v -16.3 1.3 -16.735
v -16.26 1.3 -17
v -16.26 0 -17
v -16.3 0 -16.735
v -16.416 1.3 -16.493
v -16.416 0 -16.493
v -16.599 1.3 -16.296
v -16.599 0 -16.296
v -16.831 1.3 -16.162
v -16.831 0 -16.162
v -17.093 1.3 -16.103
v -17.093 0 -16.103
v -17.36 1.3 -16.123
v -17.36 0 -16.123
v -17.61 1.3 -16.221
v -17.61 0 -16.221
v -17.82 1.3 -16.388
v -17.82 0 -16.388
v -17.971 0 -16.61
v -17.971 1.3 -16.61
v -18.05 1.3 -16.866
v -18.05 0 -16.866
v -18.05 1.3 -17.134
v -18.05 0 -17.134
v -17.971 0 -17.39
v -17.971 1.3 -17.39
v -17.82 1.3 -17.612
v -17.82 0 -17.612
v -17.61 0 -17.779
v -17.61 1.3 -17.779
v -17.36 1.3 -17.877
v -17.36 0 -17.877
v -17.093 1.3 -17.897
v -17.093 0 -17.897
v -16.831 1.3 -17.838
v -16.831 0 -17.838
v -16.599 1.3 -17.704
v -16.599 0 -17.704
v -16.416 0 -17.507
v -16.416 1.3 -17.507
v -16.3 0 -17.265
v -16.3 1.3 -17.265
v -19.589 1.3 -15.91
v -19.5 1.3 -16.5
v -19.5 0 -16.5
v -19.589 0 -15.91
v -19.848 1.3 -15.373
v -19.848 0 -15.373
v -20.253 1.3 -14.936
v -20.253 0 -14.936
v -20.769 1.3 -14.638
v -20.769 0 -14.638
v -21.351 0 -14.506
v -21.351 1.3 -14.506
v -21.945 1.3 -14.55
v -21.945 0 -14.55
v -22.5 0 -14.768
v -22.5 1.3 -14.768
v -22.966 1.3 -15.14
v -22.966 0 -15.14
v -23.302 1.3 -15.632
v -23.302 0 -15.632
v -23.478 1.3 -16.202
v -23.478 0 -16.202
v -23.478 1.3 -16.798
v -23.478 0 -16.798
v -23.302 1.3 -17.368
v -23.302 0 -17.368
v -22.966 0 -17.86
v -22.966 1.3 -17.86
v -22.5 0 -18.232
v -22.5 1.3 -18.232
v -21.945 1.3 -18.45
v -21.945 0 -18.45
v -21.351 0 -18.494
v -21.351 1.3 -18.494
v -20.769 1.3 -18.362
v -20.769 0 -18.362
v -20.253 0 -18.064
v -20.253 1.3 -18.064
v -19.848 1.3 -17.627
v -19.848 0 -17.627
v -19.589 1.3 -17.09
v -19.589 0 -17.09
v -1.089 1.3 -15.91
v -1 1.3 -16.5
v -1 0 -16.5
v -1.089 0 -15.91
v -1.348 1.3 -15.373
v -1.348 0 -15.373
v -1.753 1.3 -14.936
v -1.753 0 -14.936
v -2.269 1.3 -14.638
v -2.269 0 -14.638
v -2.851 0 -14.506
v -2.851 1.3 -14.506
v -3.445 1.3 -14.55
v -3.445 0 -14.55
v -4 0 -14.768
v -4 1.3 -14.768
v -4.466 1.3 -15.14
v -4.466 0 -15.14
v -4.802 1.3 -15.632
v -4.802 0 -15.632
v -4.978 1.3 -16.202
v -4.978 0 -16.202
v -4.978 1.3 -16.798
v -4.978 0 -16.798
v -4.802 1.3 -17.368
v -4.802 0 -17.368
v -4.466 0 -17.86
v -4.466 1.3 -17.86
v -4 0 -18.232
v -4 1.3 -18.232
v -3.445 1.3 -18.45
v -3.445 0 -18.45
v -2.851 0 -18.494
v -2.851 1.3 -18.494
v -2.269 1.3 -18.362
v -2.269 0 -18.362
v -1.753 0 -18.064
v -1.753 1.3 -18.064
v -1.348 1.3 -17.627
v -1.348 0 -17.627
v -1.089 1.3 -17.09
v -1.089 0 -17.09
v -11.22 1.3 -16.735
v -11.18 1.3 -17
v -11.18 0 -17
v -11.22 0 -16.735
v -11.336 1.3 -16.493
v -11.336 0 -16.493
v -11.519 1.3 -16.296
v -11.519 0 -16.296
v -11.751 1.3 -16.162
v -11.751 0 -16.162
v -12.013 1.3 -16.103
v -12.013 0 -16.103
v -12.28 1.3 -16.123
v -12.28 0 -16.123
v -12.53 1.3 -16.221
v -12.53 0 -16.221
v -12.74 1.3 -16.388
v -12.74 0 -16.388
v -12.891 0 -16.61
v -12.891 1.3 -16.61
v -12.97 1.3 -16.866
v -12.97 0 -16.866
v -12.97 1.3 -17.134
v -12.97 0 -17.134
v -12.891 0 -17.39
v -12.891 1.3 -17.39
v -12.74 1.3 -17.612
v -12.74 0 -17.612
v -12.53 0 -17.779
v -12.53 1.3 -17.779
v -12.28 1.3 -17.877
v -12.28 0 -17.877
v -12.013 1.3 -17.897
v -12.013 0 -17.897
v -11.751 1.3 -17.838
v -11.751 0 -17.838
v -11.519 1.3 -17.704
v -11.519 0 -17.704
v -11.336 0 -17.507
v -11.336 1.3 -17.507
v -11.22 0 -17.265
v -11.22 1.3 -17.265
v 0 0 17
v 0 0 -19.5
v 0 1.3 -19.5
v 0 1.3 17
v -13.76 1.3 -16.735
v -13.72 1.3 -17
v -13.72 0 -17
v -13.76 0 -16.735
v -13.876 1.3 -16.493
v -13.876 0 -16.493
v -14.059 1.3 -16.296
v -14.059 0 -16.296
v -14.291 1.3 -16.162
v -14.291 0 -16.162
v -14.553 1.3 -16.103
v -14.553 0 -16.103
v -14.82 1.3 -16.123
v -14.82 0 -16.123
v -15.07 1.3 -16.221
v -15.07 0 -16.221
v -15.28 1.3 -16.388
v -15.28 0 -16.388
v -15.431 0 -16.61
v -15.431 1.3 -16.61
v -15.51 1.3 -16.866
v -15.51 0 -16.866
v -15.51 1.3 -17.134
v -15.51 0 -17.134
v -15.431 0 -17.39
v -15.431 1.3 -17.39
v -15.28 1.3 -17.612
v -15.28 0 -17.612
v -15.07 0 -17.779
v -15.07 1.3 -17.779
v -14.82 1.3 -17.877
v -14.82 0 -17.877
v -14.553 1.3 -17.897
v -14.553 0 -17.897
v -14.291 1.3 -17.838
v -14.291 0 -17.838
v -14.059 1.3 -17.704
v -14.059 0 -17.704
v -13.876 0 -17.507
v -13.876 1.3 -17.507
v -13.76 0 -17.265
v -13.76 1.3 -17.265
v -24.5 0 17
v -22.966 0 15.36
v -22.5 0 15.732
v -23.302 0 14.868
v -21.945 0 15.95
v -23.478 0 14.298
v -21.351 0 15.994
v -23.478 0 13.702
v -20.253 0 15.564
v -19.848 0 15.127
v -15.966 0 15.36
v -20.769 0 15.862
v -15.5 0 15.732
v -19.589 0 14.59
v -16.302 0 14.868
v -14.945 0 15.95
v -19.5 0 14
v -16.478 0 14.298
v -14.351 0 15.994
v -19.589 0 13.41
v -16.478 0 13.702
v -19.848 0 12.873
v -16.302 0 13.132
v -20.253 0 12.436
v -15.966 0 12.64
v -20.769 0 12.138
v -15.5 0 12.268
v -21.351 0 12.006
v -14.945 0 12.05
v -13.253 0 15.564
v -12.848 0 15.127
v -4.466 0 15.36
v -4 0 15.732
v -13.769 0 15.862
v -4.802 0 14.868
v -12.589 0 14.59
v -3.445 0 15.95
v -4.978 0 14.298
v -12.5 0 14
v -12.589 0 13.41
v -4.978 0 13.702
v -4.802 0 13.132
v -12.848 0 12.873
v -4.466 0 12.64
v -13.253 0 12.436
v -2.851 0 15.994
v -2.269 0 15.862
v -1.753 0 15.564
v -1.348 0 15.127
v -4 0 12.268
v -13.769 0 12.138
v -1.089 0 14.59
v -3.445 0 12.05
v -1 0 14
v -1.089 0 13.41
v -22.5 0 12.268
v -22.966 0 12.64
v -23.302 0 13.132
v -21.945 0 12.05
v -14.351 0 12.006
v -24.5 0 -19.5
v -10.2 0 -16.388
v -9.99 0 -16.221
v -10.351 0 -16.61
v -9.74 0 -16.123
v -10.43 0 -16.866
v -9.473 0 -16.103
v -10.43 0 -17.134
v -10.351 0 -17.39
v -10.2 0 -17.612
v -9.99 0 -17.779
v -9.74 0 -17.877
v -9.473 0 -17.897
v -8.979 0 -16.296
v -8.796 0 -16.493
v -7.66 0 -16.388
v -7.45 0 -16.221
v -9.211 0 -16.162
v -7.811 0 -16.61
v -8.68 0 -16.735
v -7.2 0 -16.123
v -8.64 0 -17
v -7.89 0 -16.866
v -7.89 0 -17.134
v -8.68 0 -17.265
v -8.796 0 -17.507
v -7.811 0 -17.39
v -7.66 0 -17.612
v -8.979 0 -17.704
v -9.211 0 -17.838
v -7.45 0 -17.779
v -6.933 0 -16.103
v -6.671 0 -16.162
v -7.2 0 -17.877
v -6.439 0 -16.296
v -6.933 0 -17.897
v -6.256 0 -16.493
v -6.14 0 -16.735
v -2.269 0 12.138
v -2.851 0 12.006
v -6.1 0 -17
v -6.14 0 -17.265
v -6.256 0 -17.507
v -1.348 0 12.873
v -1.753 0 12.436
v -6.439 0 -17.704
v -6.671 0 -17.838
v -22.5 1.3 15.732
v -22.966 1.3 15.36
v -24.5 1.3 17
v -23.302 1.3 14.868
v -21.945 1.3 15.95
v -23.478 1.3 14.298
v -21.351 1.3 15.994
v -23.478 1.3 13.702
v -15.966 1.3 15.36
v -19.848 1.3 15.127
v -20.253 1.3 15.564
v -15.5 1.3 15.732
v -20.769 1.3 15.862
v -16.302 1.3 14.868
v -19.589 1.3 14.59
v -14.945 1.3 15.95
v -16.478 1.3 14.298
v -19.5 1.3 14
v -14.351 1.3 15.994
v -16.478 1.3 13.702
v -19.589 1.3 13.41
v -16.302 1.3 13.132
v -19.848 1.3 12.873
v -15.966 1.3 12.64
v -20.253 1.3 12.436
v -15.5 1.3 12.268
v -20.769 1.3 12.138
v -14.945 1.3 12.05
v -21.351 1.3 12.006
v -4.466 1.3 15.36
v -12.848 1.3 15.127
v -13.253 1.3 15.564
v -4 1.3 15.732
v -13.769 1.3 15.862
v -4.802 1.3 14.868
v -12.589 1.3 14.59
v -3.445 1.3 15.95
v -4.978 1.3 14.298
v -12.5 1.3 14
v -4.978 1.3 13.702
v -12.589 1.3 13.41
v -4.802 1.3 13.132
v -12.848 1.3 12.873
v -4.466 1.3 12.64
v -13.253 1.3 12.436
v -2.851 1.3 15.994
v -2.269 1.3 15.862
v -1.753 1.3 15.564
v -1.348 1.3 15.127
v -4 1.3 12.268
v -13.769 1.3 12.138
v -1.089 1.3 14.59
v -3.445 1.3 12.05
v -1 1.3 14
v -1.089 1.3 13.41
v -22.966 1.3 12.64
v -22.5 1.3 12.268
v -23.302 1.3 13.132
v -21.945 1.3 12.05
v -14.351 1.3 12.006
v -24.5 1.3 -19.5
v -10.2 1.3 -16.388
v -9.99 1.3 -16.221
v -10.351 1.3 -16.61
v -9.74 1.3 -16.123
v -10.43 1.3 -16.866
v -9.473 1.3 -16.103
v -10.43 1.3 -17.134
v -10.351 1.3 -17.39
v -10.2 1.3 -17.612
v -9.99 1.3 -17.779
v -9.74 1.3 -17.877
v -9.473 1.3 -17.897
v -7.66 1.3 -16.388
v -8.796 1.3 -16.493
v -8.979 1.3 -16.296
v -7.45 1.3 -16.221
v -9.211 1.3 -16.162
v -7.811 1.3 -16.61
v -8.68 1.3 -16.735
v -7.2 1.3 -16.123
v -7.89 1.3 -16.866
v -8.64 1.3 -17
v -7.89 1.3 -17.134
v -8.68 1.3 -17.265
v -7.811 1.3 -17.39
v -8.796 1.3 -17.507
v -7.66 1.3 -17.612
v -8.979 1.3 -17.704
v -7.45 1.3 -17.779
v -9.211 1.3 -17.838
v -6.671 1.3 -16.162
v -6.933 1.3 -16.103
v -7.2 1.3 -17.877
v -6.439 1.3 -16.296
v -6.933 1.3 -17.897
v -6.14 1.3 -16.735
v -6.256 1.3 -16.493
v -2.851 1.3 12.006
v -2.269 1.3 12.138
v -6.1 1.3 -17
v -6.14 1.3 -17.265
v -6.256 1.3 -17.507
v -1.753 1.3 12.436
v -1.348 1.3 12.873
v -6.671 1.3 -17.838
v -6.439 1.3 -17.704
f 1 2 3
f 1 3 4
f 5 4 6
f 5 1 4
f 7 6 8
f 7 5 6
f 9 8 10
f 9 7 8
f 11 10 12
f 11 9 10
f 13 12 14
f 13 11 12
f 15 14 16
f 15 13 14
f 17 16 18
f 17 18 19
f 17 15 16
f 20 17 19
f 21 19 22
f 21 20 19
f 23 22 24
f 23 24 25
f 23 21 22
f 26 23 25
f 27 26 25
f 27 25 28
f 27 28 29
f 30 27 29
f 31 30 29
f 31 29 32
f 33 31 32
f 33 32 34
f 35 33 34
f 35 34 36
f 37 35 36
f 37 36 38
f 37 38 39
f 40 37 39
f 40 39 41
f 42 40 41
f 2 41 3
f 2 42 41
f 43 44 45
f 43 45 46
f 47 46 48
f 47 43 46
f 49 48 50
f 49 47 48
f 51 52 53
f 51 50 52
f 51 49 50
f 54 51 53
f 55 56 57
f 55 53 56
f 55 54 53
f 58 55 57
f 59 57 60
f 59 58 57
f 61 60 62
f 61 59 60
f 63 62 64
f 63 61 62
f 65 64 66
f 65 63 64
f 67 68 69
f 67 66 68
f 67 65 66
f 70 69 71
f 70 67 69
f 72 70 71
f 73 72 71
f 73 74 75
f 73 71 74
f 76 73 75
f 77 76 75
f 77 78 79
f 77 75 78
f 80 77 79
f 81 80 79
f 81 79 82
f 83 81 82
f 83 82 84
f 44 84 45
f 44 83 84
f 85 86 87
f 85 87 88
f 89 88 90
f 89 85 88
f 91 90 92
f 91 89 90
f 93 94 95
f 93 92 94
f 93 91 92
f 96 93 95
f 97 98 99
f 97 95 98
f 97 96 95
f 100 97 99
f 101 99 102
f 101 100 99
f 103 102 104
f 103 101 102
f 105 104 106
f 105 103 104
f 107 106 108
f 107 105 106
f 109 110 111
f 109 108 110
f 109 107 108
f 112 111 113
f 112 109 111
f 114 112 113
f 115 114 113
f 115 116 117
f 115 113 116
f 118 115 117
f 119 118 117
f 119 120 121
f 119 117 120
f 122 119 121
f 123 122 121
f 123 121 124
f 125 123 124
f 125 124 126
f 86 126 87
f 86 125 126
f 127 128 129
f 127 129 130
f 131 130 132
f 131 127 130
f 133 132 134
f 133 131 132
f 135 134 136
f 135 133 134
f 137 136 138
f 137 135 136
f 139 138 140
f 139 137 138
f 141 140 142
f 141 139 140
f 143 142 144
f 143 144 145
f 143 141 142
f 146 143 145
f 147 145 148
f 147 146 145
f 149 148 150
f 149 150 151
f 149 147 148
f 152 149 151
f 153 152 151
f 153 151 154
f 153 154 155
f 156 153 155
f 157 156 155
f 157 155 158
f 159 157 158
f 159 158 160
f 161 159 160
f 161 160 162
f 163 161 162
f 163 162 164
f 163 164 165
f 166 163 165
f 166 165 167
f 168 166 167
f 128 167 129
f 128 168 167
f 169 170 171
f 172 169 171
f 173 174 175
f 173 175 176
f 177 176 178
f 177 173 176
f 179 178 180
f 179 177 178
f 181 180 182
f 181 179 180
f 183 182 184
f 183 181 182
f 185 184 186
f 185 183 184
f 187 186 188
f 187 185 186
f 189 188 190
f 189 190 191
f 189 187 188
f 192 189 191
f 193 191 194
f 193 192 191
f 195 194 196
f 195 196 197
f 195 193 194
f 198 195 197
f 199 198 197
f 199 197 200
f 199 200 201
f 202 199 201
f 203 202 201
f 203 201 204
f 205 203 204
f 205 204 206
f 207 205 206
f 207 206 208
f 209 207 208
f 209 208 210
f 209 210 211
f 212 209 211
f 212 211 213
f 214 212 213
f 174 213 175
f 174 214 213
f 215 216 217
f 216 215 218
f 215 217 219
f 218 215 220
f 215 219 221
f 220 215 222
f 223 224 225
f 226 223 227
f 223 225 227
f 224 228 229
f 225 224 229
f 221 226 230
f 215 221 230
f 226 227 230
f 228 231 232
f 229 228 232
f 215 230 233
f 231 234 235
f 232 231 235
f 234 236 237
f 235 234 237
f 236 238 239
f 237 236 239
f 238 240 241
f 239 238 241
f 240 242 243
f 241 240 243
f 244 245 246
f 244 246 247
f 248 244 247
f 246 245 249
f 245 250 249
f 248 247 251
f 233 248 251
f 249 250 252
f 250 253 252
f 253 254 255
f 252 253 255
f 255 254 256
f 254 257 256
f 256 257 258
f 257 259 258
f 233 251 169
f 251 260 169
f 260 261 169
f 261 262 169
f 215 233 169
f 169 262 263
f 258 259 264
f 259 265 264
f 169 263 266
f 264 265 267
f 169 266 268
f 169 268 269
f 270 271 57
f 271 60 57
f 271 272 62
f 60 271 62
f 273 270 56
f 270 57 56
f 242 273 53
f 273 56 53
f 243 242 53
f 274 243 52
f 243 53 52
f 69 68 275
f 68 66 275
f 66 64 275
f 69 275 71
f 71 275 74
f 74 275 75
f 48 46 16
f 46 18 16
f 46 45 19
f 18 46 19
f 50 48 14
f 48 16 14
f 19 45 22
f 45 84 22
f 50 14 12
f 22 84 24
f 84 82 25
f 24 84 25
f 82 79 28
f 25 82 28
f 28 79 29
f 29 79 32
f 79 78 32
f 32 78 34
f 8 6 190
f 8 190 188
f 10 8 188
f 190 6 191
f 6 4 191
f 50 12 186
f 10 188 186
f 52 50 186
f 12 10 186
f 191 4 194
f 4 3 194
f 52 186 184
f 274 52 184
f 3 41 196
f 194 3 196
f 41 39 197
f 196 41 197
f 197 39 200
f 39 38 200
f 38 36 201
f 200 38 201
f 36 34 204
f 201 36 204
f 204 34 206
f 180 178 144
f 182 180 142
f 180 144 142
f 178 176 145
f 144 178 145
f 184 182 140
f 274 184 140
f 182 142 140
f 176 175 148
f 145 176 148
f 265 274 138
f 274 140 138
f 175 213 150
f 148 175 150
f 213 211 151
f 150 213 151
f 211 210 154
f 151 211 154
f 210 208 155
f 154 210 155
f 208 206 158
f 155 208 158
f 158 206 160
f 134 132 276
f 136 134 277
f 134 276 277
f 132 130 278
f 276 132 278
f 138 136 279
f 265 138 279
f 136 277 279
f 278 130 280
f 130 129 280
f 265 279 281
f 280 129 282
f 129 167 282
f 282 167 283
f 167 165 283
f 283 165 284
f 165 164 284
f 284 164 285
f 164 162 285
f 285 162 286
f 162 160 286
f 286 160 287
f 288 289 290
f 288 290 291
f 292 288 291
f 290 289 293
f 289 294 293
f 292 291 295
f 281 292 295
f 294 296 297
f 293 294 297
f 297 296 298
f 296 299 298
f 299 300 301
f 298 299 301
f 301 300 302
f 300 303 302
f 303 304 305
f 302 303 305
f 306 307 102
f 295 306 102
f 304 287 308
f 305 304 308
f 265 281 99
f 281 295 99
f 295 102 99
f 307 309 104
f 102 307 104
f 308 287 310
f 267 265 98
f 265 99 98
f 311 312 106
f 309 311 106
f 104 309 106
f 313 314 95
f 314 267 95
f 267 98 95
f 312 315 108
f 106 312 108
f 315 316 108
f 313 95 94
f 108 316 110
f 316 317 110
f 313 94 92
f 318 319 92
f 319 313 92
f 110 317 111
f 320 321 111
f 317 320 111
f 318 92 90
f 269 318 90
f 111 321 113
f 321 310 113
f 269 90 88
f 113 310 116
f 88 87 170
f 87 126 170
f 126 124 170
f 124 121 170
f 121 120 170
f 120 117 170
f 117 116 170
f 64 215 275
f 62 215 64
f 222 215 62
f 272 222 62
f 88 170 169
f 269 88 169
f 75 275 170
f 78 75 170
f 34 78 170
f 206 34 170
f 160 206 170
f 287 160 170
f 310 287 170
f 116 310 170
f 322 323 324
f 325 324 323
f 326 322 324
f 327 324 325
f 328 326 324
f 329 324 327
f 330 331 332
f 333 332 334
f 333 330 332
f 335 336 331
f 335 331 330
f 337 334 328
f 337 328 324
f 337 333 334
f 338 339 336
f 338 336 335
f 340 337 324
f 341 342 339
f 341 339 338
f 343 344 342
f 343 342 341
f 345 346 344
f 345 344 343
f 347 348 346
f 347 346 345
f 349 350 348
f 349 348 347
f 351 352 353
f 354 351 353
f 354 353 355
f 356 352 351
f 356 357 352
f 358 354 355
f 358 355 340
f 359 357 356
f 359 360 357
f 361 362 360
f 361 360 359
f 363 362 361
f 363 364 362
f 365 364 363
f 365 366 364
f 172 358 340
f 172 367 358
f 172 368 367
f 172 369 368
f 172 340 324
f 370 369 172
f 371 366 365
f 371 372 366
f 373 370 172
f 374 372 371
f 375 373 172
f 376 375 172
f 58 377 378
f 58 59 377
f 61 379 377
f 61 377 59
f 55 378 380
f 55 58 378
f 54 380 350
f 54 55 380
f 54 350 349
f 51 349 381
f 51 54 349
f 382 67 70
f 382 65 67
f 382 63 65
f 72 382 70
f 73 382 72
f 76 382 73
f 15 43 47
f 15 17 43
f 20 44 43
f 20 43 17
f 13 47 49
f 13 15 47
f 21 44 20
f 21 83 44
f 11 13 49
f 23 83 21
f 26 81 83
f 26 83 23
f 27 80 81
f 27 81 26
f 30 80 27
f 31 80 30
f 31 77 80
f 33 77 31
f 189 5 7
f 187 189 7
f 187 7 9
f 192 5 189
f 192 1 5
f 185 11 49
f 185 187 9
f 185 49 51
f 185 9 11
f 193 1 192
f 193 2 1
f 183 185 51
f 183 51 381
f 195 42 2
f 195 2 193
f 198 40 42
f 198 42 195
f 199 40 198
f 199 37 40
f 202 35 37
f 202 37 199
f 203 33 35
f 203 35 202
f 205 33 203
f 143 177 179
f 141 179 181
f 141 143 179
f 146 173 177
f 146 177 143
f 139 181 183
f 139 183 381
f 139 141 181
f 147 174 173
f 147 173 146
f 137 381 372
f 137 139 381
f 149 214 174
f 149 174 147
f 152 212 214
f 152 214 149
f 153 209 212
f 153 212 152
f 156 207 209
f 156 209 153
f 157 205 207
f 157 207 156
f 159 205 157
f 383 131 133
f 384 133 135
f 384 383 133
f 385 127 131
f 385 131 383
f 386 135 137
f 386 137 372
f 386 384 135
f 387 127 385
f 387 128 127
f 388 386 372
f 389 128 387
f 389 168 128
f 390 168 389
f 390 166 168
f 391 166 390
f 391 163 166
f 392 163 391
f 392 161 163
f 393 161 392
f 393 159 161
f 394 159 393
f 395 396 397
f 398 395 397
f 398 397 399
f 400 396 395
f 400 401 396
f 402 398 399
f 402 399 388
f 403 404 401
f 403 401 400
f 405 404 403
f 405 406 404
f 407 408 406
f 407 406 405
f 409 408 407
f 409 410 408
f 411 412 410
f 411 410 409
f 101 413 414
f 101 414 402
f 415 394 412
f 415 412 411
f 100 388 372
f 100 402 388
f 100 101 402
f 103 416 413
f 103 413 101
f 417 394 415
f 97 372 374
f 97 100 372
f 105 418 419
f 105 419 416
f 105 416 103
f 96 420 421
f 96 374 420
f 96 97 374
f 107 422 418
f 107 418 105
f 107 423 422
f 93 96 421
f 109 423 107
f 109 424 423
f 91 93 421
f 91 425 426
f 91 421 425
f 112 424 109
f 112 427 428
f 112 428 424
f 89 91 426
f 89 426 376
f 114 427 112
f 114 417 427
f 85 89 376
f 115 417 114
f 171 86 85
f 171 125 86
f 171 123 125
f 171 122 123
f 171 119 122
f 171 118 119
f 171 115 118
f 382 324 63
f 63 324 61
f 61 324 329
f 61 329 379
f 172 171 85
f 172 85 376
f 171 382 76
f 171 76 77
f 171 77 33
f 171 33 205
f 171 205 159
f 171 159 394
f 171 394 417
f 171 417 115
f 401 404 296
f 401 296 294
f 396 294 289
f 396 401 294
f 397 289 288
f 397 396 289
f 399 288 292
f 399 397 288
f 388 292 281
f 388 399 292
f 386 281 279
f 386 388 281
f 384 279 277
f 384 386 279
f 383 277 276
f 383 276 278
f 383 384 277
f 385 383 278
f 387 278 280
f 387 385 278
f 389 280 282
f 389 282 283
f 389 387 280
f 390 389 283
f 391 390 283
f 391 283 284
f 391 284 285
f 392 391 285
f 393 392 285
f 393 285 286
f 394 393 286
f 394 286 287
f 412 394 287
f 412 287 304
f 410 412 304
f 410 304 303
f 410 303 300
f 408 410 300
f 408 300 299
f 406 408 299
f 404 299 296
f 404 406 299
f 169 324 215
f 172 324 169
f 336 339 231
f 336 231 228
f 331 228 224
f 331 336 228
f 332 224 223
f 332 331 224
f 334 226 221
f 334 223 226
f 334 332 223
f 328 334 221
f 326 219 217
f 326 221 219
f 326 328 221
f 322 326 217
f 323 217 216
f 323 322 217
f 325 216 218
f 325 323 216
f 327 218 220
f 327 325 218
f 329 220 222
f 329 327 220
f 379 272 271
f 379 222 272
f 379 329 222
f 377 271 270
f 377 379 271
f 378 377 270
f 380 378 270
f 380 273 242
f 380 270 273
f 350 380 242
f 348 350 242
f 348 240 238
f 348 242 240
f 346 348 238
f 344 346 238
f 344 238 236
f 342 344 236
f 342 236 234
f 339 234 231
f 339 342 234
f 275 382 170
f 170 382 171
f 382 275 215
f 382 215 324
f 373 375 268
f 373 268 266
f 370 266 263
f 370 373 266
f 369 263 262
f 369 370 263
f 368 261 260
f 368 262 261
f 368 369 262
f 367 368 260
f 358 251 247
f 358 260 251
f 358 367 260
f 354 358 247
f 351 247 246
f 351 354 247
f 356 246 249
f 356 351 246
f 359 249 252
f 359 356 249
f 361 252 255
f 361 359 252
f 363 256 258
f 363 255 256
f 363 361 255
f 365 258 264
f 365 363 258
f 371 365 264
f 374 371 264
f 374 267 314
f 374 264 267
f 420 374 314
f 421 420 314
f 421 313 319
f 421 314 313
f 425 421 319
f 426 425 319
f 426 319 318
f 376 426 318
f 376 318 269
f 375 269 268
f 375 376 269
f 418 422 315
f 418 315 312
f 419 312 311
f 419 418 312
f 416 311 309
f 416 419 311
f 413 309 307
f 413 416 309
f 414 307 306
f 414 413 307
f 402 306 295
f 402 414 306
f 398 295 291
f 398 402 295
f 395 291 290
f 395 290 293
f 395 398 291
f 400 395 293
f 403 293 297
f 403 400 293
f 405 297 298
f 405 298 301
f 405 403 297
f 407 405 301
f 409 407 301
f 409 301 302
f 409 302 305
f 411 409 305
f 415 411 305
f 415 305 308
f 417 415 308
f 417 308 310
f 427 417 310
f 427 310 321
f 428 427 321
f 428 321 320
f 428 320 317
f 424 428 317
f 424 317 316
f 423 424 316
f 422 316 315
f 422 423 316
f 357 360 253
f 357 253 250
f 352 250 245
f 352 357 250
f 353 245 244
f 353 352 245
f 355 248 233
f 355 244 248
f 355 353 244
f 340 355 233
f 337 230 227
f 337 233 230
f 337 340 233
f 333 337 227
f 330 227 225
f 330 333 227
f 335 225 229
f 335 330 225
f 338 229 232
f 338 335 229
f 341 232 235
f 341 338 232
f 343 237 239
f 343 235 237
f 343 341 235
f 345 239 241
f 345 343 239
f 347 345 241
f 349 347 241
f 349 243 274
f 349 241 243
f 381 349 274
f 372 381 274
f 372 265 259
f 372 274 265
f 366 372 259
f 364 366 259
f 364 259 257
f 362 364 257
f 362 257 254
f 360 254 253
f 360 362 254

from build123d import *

# Parameters (mm, degrees)
CYLINDER_R        = 2
CYLINDER_DEPTH    = 10
CYLINDER168_R     = 2
CYLINDER168_DEPTH = 10
CYLINDER169_R     = 2
CYLINDER169_DEPTH = 10
CYLINDER170_R     = 2
CYLINDER170_DEPTH = 10
CYLINDER171_R     = 2
CYLINDER171_DEPTH = 10
CYLINDER166_R     = 0.9
CYLINDER166_DEPTH = 1.3
CYLINDER165_R     = 0.9
CYLINDER165_DEPTH = 1.3
CYLINDER167_R     = 0.9
CYLINDER167_DEPTH = 1.3
CYLINDER164_R     = 0.9
CYLINDER164_DEPTH = 1.3
CYLINDER163_R     = 0.9
CYLINDER163_DEPTH = 1.3
BOX_W             = 24.5
BOX_H             = 1.3
BOX_DEPTH         = 36.5


with BuildPart() as cylinder:
    # Cylinder → Cylinder (new body)
    with BuildSketch(Plane(origin=(-3, 2, 14), x_dir=(1, 0, 0), z_dir=(0, -1, 0))):
        Circle(CYLINDER_R)
    extrude(amount=CYLINDER_DEPTH)


with BuildPart() as cylinder168:
    # Cylinder168 → Cylinder168 (new body)
    with BuildSketch(Plane(origin=(-14.5, 2, 14), x_dir=(1, 0, 0), z_dir=(0, -1, 0))):
        Circle(CYLINDER168_R)
    extrude(amount=CYLINDER168_DEPTH)


with BuildPart() as cylinder169:
    # Cylinder169 → Cylinder169 (new body)
    with BuildSketch(Plane(origin=(-21.5, 2, 14), x_dir=(1, 0, 0), z_dir=(0, -1, 0))):
        Circle(CYLINDER169_R)
    extrude(amount=CYLINDER169_DEPTH)


with BuildPart() as cylinder170:
    # Cylinder170 → Cylinder170 (new body)
    with BuildSketch(Plane(origin=(-3, 2, -16.5), x_dir=(1, 0, 0), z_dir=(0, -1, 0))):
        Circle(CYLINDER170_R)
    extrude(amount=CYLINDER170_DEPTH)


with BuildPart() as cylinder171:
    # Cylinder171 → Cylinder171 (new body)
    with BuildSketch(Plane(origin=(-21.5, 2, -16.5), x_dir=(1, 0, 0), z_dir=(0, -1, 0))):
        Circle(CYLINDER171_R)
    extrude(amount=CYLINDER171_DEPTH)


with BuildPart() as cylinder166:
    # Cylinder166 → Cylinder166 (new body)
    with BuildSketch(Plane(origin=(-14.62, 1.3, -17), x_dir=(1, 0, 0), z_dir=(0, -1, 0))):
        Circle(CYLINDER166_R)
    extrude(amount=CYLINDER166_DEPTH)


with BuildPart() as cylinder165:
    # Cylinder165 → Cylinder165 (new body)
    with BuildSketch(Plane(origin=(-12.08, 1.3, -17), x_dir=(1, 0, 0), z_dir=(0, -1, 0))):
        Circle(CYLINDER165_R)
    extrude(amount=CYLINDER165_DEPTH)


with BuildPart() as cylinder167:
    # Cylinder167 → Cylinder167 (new body)
    with BuildSketch(Plane(origin=(-17.16, 1.3, -17), x_dir=(1, 0, 0), z_dir=(0, -1, 0))):
        Circle(CYLINDER167_R)
    extrude(amount=CYLINDER167_DEPTH)


with BuildPart() as cylinder164:
    # Cylinder164 → Cylinder164 (new body)
    with BuildSketch(Plane(origin=(-9.54, 1.3, -17), x_dir=(1, 0, 0), z_dir=(0, -1, 0))):
        Circle(CYLINDER164_R)
    extrude(amount=CYLINDER164_DEPTH)


with BuildPart() as pcb_cutouts:
    # Cylinder163 → Cylinder163 (new body)
    with BuildSketch(Plane(origin=(-7, 1.3, -17), x_dir=(1, 0, 0), z_dir=(0, -1, 0))):
        Circle(CYLINDER163_R)
    extrude(amount=CYLINDER163_DEPTH)

    # Fusion: union Cylinder166, Cylinder165, Cylinder167, Cylinder164
    add(cylinder166.part)
    add(cylinder165.part)
    add(cylinder167.part)
    add(cylinder164.part)

    # Fusion001: union Cylinder, Cylinder168, Cylinder169, Cylinder170, Cylinder171
    add(cylinder.part)
    add(cylinder168.part)
    add(cylinder169.part)
    add(cylinder170.part)
    add(cylinder171.part)


with BuildPart() as pcb:
    # Box → Box (new body)
    with BuildSketch(Plane(origin=(-24.5, 0, -19.5), x_dir=(1, 0, 0), z_dir=(0, 0, 1))):
        with Locations((12.25, 0.65)):
            Rectangle(BOX_W, BOX_H)
    extrude(amount=BOX_DEPTH)

    # Cut: cut pcb cutouts
    add(pcb_cutouts.part, mode=Mode.SUBTRACT)


solid = pcb.part
